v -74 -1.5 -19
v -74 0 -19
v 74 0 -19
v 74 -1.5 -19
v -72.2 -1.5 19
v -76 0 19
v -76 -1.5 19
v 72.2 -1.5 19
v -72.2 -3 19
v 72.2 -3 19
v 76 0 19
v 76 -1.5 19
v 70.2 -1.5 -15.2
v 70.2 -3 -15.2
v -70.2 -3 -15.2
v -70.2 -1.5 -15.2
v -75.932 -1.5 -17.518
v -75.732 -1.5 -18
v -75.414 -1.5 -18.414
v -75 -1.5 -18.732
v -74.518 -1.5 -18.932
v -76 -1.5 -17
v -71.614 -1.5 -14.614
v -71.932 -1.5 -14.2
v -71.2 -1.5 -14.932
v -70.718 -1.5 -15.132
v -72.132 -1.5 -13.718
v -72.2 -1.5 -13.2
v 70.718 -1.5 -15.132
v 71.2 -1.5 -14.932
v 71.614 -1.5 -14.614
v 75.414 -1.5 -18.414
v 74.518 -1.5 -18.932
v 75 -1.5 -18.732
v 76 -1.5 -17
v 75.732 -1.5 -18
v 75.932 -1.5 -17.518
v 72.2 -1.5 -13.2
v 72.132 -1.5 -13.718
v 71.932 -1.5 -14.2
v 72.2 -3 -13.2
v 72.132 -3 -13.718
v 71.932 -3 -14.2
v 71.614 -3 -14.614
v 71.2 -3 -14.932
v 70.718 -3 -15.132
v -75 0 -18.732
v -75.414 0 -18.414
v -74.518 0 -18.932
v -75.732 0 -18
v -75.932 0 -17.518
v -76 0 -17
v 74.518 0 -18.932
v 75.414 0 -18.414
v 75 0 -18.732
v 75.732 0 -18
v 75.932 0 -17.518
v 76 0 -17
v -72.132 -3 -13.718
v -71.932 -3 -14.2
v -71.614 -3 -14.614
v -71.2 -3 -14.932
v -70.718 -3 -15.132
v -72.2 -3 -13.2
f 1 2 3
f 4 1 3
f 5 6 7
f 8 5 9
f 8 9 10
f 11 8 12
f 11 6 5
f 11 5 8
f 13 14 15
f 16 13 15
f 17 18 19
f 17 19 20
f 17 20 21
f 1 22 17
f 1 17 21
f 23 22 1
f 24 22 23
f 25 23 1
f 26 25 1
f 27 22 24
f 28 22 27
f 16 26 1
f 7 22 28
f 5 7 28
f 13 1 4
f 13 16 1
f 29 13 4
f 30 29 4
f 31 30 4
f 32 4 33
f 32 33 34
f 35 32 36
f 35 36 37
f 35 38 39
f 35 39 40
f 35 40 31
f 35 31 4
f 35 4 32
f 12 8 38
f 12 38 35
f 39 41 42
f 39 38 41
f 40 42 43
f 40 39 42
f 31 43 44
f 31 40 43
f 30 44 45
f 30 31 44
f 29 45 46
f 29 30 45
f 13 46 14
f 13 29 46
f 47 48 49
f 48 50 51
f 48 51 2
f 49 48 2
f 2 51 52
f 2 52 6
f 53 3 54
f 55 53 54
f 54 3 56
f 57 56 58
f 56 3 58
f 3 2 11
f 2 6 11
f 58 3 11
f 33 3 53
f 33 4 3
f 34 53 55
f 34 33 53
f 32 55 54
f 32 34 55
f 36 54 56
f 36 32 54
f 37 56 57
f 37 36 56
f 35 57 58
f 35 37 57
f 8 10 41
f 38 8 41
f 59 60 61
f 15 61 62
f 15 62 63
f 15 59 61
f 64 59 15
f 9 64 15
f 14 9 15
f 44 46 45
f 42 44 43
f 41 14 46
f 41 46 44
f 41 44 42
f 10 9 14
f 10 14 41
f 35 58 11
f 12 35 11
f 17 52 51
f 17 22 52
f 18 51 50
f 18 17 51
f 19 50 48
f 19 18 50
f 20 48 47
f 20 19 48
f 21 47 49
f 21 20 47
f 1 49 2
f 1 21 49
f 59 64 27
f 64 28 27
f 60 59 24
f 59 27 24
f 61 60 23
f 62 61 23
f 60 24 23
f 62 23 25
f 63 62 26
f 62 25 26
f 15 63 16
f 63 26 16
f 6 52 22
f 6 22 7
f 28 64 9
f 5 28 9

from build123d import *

# Parameters (mm, degrees)
F0_W     = 152
F0_H     = 38
F1_DEPTH = 3
F3_DEPTH = 1.5
F4_R     = 2


with BuildPart() as f1:
    # F0 (on Front) → F1 (new body)
    with BuildSketch(Plane.XZ):
        Rectangle(F0_W, F0_H)
    extrude(amount=F1_DEPTH)

    # F2 (on face) → F3 (cut)
    with BuildSketch(Plane.XZ.offset(3)):
        Polygon((-72.2, 19), (-76, 19), (-76, -19), (76, -19), (76, 19), (72.2, 19), (72.2, -15.2), (-72.2, -15.2), align=None)
    extrude(amount=-F3_DEPTH, mode=Mode.SUBTRACT)

    # F4
    f4_edges = [f1.edges().sort_by_distance(p)[0] for p in [
        (76, -0.75, -19),
        (72.2, -2.25, -15.2),
        (-76, -0.75, -19),
        (-72.2, -2.25, -15.2),
    ]]
    fillet(f4_edges, radius=F4_R)


solid = f1.part
